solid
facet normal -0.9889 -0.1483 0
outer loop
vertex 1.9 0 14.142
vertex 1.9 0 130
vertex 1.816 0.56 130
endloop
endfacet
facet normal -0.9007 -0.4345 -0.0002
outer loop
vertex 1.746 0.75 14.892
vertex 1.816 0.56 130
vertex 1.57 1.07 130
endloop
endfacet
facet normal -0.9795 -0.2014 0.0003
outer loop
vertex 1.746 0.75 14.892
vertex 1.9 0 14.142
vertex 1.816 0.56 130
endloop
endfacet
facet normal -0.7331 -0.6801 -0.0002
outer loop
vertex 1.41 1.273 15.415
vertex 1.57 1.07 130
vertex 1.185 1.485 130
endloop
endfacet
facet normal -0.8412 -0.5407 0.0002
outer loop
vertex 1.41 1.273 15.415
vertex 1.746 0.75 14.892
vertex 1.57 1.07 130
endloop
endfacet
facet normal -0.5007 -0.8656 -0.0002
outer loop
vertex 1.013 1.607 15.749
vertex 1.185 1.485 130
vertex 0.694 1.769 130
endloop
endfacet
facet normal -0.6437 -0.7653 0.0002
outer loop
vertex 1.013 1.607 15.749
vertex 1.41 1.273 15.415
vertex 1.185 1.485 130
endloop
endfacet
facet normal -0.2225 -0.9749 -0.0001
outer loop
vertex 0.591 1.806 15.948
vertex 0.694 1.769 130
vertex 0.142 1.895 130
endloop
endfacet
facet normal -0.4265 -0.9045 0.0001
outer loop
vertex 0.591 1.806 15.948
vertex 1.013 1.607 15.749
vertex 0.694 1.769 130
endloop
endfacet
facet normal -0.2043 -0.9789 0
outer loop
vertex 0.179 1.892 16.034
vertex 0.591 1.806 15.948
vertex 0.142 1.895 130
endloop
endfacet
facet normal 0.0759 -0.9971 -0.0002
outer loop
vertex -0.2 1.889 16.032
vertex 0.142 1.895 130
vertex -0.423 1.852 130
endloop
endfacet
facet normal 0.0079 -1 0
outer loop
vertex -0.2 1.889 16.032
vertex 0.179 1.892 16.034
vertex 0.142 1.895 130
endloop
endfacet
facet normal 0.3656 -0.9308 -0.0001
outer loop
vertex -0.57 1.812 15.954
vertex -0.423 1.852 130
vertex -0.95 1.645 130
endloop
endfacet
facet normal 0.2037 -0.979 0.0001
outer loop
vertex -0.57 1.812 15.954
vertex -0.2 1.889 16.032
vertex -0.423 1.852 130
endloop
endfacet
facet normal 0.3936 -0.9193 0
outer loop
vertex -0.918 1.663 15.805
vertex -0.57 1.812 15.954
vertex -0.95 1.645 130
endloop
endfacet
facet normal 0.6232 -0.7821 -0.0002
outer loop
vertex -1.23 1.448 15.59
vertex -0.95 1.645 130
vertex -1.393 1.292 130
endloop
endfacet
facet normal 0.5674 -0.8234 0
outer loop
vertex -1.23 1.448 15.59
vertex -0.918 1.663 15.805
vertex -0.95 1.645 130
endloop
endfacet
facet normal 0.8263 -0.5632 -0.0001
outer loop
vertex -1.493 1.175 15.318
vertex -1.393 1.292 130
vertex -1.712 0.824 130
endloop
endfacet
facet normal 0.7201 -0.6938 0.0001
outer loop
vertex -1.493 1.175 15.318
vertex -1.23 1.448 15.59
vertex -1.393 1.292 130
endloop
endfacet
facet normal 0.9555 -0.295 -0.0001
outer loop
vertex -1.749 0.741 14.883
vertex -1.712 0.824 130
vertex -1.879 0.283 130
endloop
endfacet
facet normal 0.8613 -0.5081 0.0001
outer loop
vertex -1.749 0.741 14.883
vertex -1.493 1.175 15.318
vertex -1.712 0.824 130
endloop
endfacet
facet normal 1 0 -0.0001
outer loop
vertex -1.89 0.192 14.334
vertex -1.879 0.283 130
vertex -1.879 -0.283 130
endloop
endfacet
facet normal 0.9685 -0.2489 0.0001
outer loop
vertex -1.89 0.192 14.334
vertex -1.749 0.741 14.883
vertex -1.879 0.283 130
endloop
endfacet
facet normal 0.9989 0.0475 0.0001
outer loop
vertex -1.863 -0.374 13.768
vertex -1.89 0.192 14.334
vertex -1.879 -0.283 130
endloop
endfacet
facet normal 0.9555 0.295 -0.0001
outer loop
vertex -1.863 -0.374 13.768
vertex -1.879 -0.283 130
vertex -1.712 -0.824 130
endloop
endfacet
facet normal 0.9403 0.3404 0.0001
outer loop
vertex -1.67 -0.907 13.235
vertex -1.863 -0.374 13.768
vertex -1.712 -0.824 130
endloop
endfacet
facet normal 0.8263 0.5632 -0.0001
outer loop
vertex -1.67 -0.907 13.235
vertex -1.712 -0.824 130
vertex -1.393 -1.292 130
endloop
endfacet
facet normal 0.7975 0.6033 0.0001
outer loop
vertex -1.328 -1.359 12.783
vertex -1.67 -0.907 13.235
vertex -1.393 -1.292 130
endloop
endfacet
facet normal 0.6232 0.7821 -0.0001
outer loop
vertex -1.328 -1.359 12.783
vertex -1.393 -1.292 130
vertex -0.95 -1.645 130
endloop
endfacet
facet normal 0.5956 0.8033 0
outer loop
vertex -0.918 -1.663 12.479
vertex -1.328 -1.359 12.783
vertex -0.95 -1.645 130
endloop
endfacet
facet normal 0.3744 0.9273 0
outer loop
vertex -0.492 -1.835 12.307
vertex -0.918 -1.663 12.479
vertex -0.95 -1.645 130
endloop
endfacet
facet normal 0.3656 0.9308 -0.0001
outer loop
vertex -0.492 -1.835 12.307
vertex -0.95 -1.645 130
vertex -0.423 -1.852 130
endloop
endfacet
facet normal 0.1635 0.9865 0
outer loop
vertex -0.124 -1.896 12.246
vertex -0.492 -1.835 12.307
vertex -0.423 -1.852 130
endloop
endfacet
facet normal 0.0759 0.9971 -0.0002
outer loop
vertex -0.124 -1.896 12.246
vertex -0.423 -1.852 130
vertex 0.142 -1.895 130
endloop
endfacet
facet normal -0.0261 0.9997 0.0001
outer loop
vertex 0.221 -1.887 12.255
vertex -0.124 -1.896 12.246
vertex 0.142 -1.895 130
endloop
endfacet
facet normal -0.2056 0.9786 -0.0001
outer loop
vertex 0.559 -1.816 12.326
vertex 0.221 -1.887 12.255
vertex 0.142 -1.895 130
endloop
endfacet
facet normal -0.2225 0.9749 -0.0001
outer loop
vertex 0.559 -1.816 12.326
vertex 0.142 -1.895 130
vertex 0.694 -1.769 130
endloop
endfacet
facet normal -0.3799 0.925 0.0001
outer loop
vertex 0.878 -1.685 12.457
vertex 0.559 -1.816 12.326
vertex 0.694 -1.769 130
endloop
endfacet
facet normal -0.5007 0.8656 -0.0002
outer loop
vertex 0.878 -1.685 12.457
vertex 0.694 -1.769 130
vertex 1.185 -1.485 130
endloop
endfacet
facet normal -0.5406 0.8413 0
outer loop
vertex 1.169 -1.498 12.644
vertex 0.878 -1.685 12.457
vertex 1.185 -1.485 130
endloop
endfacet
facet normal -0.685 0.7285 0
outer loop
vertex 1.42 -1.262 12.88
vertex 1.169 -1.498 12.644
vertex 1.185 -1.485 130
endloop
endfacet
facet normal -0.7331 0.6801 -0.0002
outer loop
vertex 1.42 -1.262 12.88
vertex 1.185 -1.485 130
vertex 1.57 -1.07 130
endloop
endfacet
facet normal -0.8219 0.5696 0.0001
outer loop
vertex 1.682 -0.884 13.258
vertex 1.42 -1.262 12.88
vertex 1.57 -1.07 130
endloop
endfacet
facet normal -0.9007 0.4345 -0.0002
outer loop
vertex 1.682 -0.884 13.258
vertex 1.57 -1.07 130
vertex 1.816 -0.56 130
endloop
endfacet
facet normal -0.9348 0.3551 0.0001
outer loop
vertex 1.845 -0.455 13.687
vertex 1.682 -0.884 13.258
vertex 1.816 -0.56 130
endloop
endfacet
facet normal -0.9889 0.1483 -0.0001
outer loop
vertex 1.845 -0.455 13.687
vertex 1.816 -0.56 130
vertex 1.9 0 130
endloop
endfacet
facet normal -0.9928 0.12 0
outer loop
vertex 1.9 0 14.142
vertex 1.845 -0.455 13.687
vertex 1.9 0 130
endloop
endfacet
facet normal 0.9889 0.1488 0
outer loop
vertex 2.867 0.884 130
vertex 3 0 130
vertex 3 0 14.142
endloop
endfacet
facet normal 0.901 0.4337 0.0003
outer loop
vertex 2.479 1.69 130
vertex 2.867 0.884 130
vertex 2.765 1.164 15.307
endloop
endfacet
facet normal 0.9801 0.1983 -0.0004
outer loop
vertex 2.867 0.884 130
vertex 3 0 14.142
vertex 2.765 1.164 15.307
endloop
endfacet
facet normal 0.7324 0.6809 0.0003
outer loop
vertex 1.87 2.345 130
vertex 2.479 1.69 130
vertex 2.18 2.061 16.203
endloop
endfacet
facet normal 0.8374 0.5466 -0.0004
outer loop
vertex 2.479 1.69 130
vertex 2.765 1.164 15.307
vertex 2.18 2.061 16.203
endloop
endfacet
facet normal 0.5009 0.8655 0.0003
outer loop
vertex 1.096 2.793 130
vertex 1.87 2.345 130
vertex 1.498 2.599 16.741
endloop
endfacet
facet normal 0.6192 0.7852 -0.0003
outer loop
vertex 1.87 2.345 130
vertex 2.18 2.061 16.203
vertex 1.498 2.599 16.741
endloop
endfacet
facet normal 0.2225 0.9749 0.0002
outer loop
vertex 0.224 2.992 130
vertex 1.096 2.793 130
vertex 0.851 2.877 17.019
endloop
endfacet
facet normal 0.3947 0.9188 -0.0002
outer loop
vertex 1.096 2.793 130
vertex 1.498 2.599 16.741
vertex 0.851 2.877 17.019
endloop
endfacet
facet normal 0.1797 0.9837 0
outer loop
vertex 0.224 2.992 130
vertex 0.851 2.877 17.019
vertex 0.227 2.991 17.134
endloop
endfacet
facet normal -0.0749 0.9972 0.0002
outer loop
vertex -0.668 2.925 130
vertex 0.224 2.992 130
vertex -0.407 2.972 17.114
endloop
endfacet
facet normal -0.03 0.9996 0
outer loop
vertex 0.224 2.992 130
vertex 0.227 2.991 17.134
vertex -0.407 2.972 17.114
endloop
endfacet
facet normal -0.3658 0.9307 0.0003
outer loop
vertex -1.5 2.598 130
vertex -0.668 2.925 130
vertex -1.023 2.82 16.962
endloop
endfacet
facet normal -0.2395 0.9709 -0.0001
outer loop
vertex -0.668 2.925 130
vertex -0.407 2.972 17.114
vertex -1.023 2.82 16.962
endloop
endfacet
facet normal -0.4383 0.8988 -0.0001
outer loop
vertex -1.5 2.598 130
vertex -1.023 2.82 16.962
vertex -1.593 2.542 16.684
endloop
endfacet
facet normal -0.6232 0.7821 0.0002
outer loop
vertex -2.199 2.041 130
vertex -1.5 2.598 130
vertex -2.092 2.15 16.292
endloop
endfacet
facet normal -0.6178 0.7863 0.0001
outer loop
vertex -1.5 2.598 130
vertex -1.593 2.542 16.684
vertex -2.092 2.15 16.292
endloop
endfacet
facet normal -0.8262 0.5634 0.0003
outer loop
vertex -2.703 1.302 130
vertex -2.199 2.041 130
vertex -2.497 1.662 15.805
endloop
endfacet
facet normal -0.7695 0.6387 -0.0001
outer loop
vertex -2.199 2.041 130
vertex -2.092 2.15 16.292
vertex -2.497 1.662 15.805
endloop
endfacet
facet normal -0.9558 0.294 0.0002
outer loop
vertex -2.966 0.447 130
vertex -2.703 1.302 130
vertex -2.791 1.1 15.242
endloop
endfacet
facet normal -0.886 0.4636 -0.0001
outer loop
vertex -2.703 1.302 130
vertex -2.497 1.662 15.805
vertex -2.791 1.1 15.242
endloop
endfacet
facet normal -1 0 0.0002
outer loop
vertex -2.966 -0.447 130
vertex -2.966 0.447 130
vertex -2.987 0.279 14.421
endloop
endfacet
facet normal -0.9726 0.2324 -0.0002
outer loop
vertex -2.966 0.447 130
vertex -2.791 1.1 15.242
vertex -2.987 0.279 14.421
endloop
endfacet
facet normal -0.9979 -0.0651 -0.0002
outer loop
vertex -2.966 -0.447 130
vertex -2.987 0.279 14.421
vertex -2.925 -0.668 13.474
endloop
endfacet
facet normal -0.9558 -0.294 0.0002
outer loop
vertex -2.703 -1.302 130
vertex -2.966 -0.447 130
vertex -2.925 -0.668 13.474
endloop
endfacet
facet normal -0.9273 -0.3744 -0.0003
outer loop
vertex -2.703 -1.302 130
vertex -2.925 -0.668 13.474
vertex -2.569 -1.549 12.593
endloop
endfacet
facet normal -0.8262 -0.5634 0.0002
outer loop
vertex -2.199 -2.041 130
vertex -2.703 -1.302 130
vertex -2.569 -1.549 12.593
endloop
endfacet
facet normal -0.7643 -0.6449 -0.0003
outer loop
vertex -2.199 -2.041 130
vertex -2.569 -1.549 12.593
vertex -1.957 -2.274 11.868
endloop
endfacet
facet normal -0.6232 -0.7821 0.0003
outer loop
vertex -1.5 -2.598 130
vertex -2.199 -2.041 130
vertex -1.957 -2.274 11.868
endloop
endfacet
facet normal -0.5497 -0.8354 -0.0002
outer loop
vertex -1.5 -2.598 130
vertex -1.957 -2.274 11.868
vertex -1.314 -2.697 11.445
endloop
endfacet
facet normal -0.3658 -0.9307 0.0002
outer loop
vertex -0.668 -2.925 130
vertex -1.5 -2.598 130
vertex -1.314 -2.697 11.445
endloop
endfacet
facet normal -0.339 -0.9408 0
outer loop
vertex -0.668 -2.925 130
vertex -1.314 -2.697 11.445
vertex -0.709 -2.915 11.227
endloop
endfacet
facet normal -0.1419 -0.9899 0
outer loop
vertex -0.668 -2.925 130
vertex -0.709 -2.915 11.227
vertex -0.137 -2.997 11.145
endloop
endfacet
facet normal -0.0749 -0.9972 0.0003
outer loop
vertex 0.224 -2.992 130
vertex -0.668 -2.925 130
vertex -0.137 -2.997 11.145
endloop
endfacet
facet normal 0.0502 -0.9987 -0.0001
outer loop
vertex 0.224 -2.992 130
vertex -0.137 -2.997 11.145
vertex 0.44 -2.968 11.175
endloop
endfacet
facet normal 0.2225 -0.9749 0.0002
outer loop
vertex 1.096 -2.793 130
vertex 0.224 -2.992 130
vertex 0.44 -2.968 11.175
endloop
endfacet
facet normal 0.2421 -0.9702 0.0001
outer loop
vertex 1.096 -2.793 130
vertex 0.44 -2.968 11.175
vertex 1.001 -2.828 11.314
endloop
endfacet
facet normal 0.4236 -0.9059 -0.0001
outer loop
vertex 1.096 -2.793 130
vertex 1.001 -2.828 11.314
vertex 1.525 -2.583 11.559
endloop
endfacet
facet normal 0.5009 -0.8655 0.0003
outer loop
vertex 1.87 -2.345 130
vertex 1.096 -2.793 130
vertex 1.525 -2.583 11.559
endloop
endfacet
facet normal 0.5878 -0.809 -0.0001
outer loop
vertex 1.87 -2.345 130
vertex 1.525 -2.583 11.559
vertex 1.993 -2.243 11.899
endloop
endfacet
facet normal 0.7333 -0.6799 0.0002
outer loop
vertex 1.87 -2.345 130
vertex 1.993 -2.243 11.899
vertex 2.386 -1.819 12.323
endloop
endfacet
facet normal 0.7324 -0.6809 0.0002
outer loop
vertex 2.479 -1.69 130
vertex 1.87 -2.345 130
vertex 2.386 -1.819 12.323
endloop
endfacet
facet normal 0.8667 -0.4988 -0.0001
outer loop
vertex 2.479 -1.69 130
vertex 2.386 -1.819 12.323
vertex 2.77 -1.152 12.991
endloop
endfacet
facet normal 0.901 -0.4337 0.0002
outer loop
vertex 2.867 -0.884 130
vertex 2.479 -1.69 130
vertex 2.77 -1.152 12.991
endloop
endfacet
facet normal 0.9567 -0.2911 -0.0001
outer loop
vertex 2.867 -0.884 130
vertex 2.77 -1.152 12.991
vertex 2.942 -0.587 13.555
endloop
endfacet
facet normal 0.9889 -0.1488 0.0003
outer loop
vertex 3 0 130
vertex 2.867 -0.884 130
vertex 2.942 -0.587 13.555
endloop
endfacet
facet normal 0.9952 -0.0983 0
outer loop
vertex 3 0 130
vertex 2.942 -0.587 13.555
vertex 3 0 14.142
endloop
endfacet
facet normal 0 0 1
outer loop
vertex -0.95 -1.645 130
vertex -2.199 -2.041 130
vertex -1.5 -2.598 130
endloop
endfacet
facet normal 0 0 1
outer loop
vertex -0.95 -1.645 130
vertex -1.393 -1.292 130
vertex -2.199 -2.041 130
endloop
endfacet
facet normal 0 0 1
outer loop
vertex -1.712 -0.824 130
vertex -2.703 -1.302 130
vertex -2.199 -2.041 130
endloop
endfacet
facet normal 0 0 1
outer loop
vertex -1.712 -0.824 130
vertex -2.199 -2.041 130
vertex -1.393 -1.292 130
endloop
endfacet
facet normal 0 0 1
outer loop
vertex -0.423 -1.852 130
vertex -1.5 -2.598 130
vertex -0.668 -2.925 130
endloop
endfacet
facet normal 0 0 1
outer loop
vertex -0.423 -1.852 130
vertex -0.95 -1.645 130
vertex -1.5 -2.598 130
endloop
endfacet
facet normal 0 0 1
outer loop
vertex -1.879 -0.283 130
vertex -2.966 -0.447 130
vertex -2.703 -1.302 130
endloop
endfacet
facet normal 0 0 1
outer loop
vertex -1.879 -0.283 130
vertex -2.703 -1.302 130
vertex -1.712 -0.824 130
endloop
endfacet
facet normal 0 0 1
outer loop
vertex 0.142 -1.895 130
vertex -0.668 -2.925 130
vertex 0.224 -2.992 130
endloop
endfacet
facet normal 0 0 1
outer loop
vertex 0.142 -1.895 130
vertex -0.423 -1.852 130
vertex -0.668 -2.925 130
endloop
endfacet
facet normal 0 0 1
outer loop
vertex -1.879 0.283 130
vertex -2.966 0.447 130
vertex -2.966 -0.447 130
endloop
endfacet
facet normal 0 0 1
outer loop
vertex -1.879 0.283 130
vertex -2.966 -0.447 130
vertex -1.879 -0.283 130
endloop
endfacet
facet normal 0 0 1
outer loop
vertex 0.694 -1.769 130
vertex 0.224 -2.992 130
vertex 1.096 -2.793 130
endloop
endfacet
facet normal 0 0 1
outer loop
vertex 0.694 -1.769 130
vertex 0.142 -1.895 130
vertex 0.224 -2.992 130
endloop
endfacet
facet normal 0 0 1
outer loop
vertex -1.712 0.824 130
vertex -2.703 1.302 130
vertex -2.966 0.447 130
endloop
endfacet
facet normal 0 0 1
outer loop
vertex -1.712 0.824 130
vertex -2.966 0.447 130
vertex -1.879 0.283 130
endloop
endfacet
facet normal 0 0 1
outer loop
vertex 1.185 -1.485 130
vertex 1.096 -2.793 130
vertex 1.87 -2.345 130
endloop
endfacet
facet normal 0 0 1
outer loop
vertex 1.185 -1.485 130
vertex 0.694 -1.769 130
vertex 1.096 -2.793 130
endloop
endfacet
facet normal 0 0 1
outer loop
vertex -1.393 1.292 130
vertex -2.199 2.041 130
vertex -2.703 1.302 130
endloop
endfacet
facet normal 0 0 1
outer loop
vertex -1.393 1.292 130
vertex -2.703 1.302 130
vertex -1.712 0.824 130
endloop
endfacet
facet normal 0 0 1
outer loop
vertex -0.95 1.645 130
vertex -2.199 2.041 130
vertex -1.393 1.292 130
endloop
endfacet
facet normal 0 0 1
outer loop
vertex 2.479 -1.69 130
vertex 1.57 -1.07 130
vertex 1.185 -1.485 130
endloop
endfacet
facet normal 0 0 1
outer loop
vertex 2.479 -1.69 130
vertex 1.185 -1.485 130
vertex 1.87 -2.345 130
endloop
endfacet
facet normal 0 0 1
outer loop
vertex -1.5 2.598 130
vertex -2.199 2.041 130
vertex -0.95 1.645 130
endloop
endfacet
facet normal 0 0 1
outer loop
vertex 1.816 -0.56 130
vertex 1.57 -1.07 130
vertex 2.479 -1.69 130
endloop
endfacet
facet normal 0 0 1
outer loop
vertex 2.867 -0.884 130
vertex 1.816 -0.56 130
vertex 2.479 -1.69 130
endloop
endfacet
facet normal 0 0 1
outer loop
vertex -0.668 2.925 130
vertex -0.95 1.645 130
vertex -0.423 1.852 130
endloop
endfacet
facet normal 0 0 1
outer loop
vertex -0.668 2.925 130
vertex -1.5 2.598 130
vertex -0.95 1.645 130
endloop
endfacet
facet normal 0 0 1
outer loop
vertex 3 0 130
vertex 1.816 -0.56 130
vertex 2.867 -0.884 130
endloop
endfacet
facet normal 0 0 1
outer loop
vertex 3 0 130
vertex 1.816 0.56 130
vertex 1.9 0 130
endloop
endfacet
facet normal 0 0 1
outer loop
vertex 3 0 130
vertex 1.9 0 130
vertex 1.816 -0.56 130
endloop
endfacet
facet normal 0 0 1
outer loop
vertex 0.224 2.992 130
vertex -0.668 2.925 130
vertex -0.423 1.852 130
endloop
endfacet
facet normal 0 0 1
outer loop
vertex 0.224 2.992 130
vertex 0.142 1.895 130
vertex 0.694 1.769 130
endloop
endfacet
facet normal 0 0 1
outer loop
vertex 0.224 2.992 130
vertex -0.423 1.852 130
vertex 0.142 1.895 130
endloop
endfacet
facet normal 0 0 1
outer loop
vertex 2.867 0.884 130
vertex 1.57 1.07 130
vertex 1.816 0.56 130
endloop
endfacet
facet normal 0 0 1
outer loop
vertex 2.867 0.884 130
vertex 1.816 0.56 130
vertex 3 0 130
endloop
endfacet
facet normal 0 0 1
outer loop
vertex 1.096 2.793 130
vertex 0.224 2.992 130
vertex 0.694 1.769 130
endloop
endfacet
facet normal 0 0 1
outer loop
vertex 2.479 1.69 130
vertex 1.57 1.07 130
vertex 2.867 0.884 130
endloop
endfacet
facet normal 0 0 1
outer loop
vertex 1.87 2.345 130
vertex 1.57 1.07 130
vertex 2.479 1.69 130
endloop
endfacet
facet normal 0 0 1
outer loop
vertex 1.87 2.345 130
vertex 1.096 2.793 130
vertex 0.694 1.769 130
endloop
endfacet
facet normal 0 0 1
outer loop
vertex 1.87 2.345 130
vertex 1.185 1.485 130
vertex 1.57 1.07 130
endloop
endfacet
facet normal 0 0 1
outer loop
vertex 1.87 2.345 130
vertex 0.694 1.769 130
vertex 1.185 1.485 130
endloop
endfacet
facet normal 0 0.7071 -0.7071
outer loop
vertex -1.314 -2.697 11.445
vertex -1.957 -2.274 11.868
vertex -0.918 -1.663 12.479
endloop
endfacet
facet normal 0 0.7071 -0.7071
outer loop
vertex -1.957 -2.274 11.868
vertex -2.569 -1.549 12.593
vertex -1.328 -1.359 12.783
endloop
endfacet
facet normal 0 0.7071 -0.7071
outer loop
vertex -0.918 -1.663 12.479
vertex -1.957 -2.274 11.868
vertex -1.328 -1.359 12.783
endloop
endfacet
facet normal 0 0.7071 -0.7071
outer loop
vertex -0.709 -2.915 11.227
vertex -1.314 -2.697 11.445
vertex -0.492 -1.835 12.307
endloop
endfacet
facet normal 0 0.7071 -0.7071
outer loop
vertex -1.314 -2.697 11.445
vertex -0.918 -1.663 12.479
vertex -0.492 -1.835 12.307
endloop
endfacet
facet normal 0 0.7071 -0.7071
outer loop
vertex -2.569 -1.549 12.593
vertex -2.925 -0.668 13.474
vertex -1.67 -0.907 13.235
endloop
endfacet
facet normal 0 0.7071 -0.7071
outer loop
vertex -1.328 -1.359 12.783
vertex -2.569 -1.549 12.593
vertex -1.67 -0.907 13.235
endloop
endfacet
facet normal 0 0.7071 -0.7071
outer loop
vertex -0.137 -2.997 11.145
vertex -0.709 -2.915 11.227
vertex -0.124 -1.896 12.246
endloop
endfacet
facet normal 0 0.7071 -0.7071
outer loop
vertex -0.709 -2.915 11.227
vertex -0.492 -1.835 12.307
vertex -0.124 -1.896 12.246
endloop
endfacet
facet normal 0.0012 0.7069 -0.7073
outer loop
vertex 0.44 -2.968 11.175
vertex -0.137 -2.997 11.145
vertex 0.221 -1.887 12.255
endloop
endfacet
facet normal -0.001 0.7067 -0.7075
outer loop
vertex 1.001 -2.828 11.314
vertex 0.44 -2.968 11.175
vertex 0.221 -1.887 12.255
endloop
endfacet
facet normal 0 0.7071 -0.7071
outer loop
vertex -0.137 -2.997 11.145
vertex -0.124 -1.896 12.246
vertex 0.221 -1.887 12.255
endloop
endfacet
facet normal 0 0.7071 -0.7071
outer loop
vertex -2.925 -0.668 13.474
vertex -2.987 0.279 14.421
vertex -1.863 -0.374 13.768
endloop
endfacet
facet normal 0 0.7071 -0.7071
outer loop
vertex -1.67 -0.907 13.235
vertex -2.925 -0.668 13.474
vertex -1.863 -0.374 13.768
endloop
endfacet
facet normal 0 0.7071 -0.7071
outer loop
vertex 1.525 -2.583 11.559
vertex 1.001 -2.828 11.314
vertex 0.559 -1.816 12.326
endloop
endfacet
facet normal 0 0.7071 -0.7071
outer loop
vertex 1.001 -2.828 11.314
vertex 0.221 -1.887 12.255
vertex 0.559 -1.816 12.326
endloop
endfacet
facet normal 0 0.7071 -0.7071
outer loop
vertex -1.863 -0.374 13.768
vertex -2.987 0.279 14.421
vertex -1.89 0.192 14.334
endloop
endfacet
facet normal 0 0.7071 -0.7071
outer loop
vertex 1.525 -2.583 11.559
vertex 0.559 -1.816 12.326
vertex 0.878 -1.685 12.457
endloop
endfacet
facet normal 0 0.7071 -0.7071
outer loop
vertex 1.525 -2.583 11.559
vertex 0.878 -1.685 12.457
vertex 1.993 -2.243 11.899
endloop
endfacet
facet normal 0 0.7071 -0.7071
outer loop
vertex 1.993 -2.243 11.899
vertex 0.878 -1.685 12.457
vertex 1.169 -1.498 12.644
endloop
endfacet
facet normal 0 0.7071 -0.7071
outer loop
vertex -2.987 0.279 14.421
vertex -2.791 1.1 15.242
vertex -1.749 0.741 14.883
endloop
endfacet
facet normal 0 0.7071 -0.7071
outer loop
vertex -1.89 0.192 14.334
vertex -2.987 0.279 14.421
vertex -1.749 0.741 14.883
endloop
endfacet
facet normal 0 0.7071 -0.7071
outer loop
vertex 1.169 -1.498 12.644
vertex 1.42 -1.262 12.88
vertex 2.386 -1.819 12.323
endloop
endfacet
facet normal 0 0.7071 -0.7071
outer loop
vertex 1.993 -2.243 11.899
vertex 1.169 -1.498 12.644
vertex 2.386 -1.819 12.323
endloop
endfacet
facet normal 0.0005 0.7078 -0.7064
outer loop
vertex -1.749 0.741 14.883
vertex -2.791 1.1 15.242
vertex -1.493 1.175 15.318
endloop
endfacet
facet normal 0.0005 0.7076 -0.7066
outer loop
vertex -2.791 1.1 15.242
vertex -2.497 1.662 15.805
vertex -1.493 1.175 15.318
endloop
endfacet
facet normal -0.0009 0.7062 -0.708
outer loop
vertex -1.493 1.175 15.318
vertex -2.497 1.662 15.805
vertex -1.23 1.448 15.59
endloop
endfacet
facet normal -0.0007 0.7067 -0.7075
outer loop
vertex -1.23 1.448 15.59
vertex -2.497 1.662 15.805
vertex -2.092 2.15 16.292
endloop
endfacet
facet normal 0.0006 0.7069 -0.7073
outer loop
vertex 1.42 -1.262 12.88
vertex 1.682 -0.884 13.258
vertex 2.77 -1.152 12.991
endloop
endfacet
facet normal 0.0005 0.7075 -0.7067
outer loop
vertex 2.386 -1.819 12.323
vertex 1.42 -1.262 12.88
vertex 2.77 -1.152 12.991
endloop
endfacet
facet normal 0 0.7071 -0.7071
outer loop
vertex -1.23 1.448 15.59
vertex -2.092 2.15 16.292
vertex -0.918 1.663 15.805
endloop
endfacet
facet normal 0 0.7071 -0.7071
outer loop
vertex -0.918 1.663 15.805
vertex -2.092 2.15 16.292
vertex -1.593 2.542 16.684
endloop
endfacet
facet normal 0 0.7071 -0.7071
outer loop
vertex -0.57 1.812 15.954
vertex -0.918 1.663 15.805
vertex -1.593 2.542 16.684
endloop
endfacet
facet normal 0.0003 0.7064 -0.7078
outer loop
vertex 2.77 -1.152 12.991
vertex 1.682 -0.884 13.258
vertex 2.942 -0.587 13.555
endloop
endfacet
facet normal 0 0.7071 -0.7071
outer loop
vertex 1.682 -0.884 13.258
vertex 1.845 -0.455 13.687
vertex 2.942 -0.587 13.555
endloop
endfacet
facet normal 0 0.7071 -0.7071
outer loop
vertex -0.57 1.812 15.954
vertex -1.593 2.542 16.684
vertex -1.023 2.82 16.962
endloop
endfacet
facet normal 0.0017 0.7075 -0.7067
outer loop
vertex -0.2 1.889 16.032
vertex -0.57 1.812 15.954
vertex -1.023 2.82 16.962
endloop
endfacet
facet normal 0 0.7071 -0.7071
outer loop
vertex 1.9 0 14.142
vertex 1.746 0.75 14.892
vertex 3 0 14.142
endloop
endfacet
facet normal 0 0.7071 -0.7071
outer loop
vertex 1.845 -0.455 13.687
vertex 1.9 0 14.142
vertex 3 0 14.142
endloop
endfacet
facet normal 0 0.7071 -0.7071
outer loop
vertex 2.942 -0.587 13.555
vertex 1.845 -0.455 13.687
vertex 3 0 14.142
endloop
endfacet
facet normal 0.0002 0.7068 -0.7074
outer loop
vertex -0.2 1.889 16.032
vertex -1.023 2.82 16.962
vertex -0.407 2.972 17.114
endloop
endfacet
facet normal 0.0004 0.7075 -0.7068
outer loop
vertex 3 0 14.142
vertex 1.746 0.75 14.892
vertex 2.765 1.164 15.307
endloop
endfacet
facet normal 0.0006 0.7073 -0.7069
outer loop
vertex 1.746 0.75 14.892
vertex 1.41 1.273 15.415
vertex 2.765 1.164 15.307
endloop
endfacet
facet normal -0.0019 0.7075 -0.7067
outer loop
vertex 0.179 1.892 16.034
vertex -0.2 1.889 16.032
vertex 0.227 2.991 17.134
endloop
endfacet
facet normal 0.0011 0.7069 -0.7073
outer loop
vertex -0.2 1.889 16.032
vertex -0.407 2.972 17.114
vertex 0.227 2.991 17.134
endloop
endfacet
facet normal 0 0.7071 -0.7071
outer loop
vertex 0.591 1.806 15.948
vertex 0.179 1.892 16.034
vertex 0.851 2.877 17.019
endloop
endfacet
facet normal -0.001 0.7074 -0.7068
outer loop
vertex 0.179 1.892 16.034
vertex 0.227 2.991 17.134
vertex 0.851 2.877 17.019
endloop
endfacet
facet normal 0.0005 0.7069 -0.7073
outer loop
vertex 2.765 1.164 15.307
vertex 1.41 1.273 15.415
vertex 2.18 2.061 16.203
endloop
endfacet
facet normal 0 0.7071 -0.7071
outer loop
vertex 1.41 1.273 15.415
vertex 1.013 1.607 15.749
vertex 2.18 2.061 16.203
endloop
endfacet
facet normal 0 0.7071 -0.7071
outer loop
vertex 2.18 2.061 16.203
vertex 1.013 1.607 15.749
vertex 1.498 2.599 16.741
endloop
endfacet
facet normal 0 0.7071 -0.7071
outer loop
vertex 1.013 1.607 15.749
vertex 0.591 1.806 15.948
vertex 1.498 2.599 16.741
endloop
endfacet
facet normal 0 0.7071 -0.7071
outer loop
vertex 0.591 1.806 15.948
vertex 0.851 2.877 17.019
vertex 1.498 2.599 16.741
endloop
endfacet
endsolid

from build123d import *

# Parameters (mm, degrees)
F0_R     = 3
F1_DEPTH = 130
F2_T     = -1.1
F5_R     = 26.2587558367
F6_DEPTH = 25


with BuildPart() as f1:
    # F0 (on Top) → F1 (new body)
    with BuildSketch(Plane.XY):
        Circle(F0_R)
    extrude(amount=F1_DEPTH)

    # F2
    f2_openings = [f1.faces().sort_by_distance(p)[0] for p in [
        (0, 0, 130),
    ]]
    offset(amount=F2_T, openings=f2_openings)

    # F5 (on face) → F6 (cut)
    with BuildSketch(Plane(origin=(0, -7.0710678119, 7.0710678119), x_dir=(1, 0, 0), z_dir=(0, -0.7071067812, 0.7071067812))):
        Circle(F5_R)
    extrude(amount=-F6_DEPTH, mode=Mode.SUBTRACT)


solid = f1.part
